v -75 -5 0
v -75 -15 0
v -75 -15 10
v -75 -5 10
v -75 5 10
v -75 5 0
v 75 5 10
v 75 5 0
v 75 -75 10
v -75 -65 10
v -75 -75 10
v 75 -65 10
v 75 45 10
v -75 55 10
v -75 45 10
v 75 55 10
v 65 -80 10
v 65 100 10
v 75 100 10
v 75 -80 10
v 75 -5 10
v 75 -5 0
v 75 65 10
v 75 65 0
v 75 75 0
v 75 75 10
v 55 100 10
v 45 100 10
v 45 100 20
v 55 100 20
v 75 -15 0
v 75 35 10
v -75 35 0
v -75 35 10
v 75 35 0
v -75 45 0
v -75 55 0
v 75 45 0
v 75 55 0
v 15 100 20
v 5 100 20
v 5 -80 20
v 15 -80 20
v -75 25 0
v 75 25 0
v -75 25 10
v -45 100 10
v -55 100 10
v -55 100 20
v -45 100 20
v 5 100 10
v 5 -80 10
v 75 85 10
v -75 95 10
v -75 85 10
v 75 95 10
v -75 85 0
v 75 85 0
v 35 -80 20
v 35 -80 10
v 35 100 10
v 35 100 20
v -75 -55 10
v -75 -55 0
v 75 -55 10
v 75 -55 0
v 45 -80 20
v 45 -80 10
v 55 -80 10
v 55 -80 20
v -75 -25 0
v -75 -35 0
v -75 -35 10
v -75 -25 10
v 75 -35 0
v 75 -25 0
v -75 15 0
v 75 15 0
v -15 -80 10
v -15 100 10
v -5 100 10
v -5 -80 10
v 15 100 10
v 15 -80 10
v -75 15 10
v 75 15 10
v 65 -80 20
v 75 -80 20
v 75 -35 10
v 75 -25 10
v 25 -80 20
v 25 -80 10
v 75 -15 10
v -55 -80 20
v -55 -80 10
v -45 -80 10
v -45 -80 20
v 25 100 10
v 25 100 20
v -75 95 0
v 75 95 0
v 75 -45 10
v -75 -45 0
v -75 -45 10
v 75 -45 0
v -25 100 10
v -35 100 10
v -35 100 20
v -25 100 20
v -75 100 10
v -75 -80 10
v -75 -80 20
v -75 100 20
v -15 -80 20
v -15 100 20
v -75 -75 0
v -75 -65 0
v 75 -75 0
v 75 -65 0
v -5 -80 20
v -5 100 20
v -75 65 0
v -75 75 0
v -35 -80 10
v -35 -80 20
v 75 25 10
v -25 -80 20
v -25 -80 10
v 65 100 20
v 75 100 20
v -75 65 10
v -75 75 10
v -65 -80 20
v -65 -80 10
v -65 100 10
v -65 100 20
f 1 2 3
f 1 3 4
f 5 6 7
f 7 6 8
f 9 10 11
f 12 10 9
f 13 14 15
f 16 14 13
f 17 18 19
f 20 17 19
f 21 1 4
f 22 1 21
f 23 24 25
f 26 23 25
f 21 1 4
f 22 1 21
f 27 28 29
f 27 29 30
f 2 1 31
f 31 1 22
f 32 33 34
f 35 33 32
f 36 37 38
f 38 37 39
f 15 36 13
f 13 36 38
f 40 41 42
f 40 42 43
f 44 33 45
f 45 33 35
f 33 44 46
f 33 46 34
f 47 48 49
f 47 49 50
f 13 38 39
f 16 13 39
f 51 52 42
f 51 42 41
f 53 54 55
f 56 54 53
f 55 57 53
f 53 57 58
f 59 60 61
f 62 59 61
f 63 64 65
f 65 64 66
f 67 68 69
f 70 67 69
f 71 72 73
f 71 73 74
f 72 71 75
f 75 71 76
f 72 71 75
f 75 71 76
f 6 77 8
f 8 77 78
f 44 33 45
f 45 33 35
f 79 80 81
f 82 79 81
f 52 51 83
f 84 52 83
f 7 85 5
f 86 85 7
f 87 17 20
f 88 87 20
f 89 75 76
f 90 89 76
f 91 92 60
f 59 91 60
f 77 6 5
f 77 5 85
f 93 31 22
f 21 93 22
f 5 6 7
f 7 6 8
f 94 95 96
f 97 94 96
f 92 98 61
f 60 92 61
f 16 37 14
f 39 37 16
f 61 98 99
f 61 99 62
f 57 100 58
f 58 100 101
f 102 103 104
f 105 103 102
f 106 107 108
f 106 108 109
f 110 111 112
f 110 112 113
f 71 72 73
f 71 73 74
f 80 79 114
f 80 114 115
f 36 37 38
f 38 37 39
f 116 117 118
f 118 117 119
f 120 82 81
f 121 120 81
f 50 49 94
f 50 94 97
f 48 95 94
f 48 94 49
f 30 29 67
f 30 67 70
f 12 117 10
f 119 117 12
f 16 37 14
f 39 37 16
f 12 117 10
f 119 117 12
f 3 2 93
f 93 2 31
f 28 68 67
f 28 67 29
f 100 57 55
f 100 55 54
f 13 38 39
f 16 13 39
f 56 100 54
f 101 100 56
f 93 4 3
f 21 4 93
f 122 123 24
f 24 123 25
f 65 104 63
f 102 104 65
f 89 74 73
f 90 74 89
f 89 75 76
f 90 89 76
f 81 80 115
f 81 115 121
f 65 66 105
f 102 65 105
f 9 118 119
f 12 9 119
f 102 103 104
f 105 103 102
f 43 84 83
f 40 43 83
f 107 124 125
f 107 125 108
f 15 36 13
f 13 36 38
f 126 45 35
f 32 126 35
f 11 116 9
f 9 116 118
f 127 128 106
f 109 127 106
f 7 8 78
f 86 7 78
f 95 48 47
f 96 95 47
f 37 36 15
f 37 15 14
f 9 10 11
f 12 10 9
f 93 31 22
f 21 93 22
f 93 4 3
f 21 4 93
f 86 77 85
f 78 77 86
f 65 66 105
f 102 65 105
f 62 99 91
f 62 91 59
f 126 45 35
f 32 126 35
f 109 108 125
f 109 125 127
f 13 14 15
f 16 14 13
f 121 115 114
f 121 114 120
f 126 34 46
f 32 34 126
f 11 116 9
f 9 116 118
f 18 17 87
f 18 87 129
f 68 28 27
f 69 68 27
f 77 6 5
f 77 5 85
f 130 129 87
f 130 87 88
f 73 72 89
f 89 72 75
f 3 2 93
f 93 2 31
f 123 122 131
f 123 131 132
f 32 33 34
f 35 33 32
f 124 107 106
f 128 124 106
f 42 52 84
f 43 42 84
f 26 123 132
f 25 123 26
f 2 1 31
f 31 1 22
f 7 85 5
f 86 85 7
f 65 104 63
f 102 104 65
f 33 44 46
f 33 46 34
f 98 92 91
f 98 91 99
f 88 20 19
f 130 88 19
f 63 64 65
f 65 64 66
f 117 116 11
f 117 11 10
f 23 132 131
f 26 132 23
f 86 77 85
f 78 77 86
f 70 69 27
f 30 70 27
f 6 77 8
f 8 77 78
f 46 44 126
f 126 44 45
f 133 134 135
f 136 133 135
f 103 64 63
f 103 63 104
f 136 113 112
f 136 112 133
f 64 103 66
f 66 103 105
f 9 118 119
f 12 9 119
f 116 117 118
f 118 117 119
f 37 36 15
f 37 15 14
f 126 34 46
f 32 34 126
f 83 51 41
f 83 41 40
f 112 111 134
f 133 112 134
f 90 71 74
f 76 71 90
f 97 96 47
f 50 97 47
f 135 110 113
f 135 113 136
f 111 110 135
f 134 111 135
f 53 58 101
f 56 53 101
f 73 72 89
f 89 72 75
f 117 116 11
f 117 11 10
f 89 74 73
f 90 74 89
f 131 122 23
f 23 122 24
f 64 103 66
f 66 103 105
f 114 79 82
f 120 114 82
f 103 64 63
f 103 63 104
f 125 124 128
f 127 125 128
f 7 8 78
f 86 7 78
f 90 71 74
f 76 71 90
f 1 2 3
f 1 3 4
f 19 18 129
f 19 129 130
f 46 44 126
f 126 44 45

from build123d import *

# Parameters (mm, degrees)
F0_W     = 150
F0_H     = 10
F1_DEPTH = 10
F2_DEPTH = 10
F3_W     = 10
F3_H     = 180
F4_DEPTH = 10


# Not quite as in the source:
# - a feature names something its author has since deleted; it is built from what else it names


with BuildPart() as f1:
    # F0 (on Top) → F1 (new body)
    with BuildSketch(Plane.XY):
        with Locations((0, 50)):
            Rectangle(F0_W, F0_H)
    extrude(amount=F1_DEPTH)


with BuildPart() as f1b:
    # F0 (on Top) → F1, piece 2 (new body)
    with BuildSketch(Plane.XY):
        with Locations((0, 30)):
            Rectangle(F0_W, F0_H)
    extrude(amount=F1_DEPTH)


with BuildPart() as f1c:
    # F0 (on Top) → F1, piece 3 (new body)
    with BuildSketch(Plane.XY):
        with Locations((0, 10)):
            Rectangle(F0_W, F0_H)
    extrude(amount=F1_DEPTH)


with BuildPart() as f1d:
    # F0 (on Top) → F1, piece 4 (new body)
    with BuildSketch(Plane.XY):
        with Locations((0, -10)):
            Rectangle(F0_W, F0_H)
    extrude(amount=F1_DEPTH)


with BuildPart() as f1e:
    # F0 (on Top) → F1, piece 5 (new body)
    with BuildSketch(Plane.XY):
        with Locations((0, -30)):
            Rectangle(F0_W, F0_H)
    extrude(amount=F1_DEPTH)


with BuildPart() as f1f:
    # F0 (on Top) → F1, piece 6 (new body)
    with BuildSketch(Plane.XY):
        with Locations((0, -50)):
            Rectangle(F0_W, F0_H)
    extrude(amount=F1_DEPTH)


with BuildPart() as f1g:
    # F0 (on Top) → F1, piece 7 (new body)
    with BuildSketch(Plane.XY):
        with Locations((0, -70)):
            Rectangle(F0_W, F0_H)
    extrude(amount=F1_DEPTH)


with BuildPart() as f2:
    # F0 (on Top) → F2 (new body)
    with BuildSketch(Plane.XY):
        with Locations((0, 90)):
            Rectangle(F0_W, F0_H)
    extrude(amount=F2_DEPTH)


with BuildPart() as f2b:
    # F0 (on Top) → F2, piece 2 (new body)
    with BuildSketch(Plane.XY):
        with Locations((0, 70)):
            Rectangle(F0_W, F0_H)
    extrude(amount=F2_DEPTH)


with BuildPart() as f2c:
    # F0 (on Top) → F2, piece 3 (new body)
    with BuildSketch(Plane.XY):
        with Locations((0, 50)):
            Rectangle(F0_W, F0_H)
    extrude(amount=F2_DEPTH)


with BuildPart() as f2d:
    # F0 (on Top) → F2, piece 4 (new body)
    with BuildSketch(Plane.XY):
        with Locations((0, 30)):
            Rectangle(F0_W, F0_H)
    extrude(amount=F2_DEPTH)


with BuildPart() as f2e:
    # F0 (on Top) → F2, piece 5 (new body)
    with BuildSketch(Plane.XY):
        with Locations((0, 10)):
            Rectangle(F0_W, F0_H)
    extrude(amount=F2_DEPTH)


with BuildPart() as f2f:
    # F0 (on Top) → F2, piece 6 (new body)
    with BuildSketch(Plane.XY):
        with Locations((0, -10)):
            Rectangle(F0_W, F0_H)
    extrude(amount=F2_DEPTH)


with BuildPart() as f2g:
    # F0 (on Top) → F2, piece 7 (new body)
    with BuildSketch(Plane.XY):
        with Locations((0, -30)):
            Rectangle(F0_W, F0_H)
    extrude(amount=F2_DEPTH)


with BuildPart() as f2h:
    # F0 (on Top) → F2, piece 8 (new body)
    with BuildSketch(Plane.XY):
        with Locations((0, -50)):
            Rectangle(F0_W, F0_H)
    extrude(amount=F2_DEPTH)


with BuildPart() as f2i:
    # F0 (on Top) → F2, piece 9 (new body)
    with BuildSketch(Plane.XY):
        with Locations((0, -70)):
            Rectangle(F0_W, F0_H)
    extrude(amount=F2_DEPTH)


with BuildPart() as f4:
    # F3 (on face) → F4 (new body)
    with BuildSketch(Plane.XY.offset(10)):
        with Locations((70, 10)):
            Rectangle(F3_W, F3_H)
    extrude(amount=F4_DEPTH)


with BuildPart() as f4b:
    # F3 (on face) → F4, piece 2 (new body)
    with BuildSketch(Plane.XY.offset(10)):
        with Locations((50, 10.0000017881)):
            Rectangle(F3_W, F3_H)
    extrude(amount=F4_DEPTH)


with BuildPart() as f4c:
    # F3 (on face) → F4, piece 3 (new body)
    with BuildSketch(Plane.XY.offset(10)):
        with Locations((30, 10.0000017881)):
            Rectangle(F3_W, F3_H)
    extrude(amount=F4_DEPTH)


with BuildPart() as f4d:
    # F3 (on face) → F4, piece 4 (new body)
    with BuildSketch(Plane.XY.offset(10)):
        with Locations((9.9999859929, 10.000000298)):
            Rectangle(F3_W, F3_H)
    extrude(amount=F4_DEPTH)


with BuildPart() as f4e:
    # F3 (on face) → F4, piece 5 (new body)
    with BuildSketch(Plane.XY.offset(10)):
        with Locations((-10, 10.0000017881)):
            Rectangle(F3_W, F3_H)
    extrude(amount=F4_DEPTH)


with BuildPart() as f4f:
    # F3 (on face) → F4, piece 6 (new body)
    with BuildSketch(Plane.XY.offset(10)):
        with Locations((-30, 10.0000017881)):
            Rectangle(F3_W, F3_H)
    extrude(amount=F4_DEPTH)


with BuildPart() as f4g:
    # F3 (on face) → F4, piece 7 (new body)
    with BuildSketch(Plane.XY.offset(10)):
        with Locations((-50, 10.0000017881)):
            Rectangle(F3_W, F3_H)
    extrude(amount=F4_DEPTH)


with BuildPart() as f4h:
    # F3 (on face) → F4, piece 8 (new body)
    with BuildSketch(Plane.XY.offset(10)):
        with Locations((-70, 10.0000017881)):
            Rectangle(F3_W, F3_H)
    extrude(amount=F4_DEPTH)


solid = Compound([f1.part, f1b.part, f1c.part, f1d.part, f1e.part, f1f.part, f1g.part, f2.part, f2b.part, f2c.part, f2d.part, f2e.part, f2f.part, f2g.part, f2h.part, f2i.part, f4.part, f4b.part, f4c.part, f4d.part, f4e.part, f4f.part, f4g.part, f4h.part])
